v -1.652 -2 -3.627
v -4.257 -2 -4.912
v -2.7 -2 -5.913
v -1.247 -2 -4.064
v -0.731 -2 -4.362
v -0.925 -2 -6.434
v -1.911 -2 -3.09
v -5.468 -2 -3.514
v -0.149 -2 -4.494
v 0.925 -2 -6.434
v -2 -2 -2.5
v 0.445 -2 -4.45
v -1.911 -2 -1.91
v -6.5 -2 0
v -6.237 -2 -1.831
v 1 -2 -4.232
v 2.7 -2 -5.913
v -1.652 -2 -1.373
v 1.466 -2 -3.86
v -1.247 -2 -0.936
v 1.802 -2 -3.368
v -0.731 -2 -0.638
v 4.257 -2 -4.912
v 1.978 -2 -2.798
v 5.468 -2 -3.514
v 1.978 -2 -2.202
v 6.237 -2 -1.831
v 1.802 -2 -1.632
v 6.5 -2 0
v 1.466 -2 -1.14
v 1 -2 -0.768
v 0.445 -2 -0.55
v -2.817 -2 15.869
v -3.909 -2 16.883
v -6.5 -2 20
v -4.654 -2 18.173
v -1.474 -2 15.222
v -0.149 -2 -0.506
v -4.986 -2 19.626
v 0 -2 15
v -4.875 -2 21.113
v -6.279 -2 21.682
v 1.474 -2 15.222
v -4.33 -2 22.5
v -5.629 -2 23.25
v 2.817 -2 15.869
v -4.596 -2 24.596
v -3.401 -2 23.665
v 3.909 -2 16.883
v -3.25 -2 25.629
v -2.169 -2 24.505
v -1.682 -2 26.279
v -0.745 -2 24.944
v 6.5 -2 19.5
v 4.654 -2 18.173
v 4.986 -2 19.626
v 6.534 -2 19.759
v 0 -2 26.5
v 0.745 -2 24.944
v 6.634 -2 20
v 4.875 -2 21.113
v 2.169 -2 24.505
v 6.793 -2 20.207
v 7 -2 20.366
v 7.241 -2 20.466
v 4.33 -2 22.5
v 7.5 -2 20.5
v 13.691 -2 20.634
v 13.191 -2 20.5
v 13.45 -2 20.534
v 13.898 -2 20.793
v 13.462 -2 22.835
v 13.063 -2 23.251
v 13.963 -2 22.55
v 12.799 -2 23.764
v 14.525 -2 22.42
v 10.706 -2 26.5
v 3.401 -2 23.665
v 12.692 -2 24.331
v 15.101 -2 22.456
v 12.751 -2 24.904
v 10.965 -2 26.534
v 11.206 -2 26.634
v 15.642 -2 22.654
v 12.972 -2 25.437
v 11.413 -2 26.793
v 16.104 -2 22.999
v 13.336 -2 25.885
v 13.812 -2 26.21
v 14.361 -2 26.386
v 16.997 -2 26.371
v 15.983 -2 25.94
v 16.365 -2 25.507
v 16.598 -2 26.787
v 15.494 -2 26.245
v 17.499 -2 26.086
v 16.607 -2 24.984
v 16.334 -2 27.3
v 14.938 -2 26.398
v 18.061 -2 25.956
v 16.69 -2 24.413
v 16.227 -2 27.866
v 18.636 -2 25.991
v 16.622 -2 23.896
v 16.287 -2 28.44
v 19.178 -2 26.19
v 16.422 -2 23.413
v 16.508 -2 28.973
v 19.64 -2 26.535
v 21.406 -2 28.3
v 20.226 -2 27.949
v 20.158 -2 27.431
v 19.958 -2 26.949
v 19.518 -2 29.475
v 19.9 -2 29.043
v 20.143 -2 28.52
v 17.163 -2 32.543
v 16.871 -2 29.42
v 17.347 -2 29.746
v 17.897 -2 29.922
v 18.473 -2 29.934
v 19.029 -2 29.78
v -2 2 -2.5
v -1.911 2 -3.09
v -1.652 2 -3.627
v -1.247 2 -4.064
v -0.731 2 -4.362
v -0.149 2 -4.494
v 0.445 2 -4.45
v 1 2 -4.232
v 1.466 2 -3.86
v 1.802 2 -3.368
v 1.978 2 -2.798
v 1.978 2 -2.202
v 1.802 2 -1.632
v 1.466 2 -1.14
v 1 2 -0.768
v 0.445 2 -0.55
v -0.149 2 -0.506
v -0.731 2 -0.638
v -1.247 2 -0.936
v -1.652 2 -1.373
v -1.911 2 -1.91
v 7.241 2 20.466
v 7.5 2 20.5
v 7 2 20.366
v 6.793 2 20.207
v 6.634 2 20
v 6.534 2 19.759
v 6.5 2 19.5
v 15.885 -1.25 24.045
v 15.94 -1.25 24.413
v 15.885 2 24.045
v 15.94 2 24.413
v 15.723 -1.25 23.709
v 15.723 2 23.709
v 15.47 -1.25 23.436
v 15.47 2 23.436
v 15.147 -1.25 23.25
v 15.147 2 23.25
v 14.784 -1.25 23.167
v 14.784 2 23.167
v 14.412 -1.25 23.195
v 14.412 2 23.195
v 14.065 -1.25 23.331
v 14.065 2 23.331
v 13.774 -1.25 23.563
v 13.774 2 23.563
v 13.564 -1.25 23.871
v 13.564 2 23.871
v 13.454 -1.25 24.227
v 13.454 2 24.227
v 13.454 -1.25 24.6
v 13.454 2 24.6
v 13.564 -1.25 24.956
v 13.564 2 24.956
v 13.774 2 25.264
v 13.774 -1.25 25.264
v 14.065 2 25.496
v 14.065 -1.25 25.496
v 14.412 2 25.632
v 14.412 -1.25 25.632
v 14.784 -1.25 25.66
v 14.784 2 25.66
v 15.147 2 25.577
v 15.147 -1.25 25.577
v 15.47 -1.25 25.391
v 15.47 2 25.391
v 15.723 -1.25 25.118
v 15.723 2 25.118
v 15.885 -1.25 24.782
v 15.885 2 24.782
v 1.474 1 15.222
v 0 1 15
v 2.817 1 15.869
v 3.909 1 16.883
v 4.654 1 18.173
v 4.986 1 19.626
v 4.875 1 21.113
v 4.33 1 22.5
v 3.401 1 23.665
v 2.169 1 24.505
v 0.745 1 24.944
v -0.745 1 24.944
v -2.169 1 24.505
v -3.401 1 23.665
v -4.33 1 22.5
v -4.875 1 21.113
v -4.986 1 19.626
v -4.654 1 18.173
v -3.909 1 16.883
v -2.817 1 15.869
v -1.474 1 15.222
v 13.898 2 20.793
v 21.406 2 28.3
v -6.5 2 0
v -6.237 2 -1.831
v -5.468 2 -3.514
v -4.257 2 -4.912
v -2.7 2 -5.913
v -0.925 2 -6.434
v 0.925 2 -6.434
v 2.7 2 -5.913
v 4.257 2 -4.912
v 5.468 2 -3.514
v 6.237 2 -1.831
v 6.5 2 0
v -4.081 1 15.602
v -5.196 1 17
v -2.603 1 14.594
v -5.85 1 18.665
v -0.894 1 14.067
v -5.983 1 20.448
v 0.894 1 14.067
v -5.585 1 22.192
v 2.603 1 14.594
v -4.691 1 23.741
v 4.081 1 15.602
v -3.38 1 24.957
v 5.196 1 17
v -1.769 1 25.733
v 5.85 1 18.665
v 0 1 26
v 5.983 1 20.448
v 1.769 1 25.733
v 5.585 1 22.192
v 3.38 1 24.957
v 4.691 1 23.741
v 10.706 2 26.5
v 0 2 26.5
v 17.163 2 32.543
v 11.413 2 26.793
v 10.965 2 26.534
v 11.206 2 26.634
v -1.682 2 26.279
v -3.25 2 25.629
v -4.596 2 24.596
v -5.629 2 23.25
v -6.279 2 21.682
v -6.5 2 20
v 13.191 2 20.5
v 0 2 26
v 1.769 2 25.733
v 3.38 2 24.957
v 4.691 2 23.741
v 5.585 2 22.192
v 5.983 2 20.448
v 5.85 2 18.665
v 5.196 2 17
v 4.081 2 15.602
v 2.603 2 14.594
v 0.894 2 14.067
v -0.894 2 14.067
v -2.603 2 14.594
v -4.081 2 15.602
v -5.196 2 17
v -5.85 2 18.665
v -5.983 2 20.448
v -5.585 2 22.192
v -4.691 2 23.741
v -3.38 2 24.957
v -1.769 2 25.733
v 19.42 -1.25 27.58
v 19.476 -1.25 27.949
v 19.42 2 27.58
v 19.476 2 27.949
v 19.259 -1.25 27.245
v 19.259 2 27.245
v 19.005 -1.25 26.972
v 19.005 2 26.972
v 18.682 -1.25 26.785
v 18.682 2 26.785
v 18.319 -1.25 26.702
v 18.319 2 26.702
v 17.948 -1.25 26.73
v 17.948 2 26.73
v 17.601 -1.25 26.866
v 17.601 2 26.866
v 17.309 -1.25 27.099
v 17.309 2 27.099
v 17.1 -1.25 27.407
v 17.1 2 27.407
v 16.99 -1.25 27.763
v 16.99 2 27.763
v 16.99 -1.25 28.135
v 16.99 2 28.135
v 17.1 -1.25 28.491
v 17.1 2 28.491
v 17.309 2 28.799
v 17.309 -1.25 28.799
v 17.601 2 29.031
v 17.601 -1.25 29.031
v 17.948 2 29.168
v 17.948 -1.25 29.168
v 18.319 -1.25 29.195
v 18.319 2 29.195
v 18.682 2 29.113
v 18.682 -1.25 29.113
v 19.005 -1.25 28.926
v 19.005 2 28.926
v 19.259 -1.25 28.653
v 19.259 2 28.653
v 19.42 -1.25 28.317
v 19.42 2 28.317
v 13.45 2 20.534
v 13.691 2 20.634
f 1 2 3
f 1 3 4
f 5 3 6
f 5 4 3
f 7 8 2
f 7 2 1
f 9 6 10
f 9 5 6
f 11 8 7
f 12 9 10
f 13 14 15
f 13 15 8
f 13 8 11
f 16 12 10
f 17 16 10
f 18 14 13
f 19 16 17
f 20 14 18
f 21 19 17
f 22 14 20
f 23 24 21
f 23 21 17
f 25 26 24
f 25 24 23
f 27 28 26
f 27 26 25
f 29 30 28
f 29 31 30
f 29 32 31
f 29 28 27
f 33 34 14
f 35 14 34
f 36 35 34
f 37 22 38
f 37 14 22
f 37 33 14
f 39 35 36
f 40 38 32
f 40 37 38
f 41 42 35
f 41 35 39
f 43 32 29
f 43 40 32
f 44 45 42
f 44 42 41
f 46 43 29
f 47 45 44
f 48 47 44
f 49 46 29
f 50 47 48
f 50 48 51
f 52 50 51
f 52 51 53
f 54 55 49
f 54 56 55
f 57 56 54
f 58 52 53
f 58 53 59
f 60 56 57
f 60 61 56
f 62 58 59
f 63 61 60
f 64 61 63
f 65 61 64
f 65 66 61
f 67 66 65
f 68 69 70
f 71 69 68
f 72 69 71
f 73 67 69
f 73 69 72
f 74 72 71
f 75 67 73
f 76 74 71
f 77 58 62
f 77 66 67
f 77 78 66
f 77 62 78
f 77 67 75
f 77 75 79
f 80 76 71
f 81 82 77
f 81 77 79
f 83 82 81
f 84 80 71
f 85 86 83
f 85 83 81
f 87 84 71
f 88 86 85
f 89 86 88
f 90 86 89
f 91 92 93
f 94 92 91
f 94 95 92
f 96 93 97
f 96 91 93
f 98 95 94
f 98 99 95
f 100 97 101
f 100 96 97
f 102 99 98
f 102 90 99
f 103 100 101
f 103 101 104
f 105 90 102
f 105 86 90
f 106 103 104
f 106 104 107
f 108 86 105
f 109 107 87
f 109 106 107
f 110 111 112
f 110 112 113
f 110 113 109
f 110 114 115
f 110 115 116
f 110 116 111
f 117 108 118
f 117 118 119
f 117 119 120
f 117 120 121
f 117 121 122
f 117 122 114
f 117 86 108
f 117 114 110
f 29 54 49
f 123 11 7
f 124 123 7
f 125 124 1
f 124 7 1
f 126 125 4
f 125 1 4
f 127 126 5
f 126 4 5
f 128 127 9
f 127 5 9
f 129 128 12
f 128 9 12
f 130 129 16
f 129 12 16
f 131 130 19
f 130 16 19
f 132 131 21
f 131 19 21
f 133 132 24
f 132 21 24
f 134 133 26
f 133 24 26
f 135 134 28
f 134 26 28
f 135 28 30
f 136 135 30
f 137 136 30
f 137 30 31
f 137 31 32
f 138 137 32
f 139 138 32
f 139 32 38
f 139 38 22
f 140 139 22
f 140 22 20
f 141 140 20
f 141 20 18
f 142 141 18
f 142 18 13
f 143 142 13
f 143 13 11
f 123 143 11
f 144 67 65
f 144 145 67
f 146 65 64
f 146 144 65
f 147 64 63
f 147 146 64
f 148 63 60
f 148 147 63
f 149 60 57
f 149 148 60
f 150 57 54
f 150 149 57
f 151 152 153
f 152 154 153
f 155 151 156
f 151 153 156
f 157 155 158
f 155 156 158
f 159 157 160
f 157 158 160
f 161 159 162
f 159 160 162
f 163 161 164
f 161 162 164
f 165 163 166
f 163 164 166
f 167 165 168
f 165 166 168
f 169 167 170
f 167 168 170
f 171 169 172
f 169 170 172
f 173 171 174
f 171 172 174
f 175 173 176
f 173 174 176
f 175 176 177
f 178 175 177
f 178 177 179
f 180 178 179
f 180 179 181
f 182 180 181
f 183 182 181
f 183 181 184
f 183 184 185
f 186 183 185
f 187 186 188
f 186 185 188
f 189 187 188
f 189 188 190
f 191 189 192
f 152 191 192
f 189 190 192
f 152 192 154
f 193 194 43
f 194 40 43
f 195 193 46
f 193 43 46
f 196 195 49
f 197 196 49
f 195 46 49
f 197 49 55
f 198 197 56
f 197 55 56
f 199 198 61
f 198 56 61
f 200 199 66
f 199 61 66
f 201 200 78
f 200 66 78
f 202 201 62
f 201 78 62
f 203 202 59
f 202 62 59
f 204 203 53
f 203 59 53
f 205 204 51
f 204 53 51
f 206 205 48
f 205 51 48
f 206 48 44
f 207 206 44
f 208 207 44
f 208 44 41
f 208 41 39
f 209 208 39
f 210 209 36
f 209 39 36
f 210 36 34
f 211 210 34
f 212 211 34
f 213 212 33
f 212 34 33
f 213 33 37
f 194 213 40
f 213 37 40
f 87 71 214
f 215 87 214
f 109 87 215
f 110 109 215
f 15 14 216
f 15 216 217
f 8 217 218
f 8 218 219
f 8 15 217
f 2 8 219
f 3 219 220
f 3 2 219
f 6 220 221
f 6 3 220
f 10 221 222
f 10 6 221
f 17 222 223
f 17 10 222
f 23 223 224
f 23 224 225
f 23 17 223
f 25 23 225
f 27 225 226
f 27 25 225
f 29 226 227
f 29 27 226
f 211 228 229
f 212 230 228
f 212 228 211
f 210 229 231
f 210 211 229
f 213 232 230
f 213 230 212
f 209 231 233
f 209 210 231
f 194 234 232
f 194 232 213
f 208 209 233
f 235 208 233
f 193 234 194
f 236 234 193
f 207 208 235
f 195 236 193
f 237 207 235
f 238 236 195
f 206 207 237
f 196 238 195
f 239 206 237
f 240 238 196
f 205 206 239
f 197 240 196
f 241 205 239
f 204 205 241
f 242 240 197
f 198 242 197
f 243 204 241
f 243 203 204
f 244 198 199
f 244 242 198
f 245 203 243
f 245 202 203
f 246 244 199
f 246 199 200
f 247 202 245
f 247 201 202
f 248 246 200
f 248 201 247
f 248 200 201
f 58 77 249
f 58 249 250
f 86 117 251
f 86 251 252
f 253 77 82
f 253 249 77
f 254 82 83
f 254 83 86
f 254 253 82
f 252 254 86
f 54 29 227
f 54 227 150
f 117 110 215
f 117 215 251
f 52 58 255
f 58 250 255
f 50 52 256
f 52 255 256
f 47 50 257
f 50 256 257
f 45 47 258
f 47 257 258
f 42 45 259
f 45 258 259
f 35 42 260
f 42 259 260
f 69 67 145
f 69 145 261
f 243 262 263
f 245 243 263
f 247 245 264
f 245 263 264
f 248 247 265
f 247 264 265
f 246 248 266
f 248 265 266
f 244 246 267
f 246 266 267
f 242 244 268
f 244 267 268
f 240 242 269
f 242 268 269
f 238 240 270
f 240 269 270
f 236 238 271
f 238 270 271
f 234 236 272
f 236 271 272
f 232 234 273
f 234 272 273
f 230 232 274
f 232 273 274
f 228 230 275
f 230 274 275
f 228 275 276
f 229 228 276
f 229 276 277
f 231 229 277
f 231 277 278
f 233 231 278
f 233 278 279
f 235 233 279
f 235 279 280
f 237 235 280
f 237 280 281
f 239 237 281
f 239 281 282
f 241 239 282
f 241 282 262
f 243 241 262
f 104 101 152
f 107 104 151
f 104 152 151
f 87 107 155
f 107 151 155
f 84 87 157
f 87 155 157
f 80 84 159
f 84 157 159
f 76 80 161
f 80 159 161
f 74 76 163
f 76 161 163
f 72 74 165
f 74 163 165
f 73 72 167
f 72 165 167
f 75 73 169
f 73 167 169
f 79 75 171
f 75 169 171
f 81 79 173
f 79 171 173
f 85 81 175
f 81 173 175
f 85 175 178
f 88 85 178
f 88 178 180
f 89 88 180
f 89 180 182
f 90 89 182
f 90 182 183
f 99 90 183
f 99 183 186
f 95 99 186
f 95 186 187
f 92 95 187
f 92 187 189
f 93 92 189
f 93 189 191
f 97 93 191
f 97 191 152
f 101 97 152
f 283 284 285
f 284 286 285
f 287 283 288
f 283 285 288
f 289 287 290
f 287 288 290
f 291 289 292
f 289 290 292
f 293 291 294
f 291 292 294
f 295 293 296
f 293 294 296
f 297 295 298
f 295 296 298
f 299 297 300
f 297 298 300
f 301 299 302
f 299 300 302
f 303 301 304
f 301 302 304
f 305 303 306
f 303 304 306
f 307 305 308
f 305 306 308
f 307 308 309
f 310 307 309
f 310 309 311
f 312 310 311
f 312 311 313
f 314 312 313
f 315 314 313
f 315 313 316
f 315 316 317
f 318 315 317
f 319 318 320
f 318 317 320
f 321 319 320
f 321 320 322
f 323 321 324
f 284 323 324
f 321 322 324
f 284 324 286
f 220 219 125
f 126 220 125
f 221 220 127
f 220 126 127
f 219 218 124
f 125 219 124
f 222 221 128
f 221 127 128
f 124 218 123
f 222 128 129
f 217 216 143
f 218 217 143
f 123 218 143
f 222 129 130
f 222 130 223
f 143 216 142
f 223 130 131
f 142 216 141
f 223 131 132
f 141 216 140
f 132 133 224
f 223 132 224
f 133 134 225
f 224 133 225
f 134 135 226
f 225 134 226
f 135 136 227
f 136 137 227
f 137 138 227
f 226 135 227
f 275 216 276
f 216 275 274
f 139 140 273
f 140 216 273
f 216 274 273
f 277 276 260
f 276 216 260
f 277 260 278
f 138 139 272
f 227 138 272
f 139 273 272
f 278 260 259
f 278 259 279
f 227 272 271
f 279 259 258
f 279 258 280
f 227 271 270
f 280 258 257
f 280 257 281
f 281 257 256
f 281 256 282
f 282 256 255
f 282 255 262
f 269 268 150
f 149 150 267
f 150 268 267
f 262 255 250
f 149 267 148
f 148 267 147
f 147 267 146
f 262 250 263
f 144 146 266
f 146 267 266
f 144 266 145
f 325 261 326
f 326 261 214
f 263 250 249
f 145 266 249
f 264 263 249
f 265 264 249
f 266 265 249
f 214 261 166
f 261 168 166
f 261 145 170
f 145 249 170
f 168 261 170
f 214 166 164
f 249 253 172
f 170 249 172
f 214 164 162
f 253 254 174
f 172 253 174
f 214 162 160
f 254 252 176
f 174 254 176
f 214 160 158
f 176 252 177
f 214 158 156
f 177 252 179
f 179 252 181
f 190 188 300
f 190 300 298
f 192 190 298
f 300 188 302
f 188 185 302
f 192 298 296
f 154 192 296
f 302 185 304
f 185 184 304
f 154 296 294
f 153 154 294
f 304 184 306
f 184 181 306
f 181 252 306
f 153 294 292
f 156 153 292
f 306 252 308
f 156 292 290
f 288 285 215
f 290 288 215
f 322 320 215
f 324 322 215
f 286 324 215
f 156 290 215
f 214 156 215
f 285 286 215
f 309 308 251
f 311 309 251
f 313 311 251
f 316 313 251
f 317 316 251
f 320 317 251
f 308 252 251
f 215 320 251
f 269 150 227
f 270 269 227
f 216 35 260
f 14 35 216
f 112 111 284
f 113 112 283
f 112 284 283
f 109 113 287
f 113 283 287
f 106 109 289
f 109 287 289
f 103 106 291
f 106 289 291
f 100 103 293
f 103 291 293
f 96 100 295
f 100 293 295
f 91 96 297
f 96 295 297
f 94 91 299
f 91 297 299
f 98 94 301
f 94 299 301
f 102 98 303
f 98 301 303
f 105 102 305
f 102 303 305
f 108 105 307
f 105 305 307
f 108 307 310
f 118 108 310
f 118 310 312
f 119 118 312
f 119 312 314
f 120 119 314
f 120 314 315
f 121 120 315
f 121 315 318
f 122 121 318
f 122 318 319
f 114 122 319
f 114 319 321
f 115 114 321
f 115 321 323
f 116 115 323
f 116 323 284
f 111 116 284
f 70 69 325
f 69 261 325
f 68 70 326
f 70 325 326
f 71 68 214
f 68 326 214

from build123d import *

# Parameters (mm, degrees)
BOSS_EXTRUDE1_DEPTH           = 4
DRAFT1_ANGLE                  = 45.000000004
DRAFT2_ANGLE                  = 45.000000005
F_4_0_4_DIAMETER_HOLE1_D      = 4
CSK_FOR_M3_SFHCS1_D           = 2.5
CSK_FOR_M3_SFHCS1_CSINK_D     = 4
CSK_FOR_M3_SFHCS1_CSINK_ANGLE = 90
FILLET1_R                     = 1
FILLET2_R                     = 6.5
HOLE2_D                       = 10
HOLE2_CBORE_D                 = 12
HOLE2_CBORE_DEPTH             = 1


with BuildPart() as part:
    # Sketch1 → Boss-Extrude1 (new body)
    with BuildSketch(Plane.XZ.offset(2)):
        with BuildLine():
            Line((11.12, 26.5), (-6.5, 26.5))
            Line((-6.5, 26.5), (-6.5, 0))
            ThreePointArc((-6.5, 0), (3e-09, -6.500000003), (6.500000005, 0))
            Line((6.500000005, 0), (6.500000005, 20.5))
            Line((6.500000005, 20.5), (13.605281374, 20.5))
            Line((13.605281374, 20.5), (13.605281374, 36.100603473))
            Line((13.605281374, 36.100603473), (11.12, 38.585884847))
            Line((11.12, 38.585884847), (11.12, 26.5))
        make_face()
    extrude(amount=-BOSS_EXTRUDE1_DEPTH)

    # Draft1
    draft1_faces = [part.faces().sort_by_distance(p)[0] for p in [
        (13.605281374, 0, 28.300301737),
    ]]
    draft(draft1_faces, Plane(origin=(6.500000005, 2, 20.5), x_dir=(-1, 0, 0), z_dir=(0, 0, -1)), DRAFT1_ANGLE)

    # Draft2
    draft2_faces = [part.faces().sort_by_distance(p)[0] for p in [
        (11.12, 0, 32.542942424),
    ]]
    draft(draft2_faces, Plane(origin=(11.12, 2, 26.5), x_dir=(1, 0, 0), z_dir=(0, 0, 1)), DRAFT2_ANGLE)

    # Ø4.0 (4) Diameter Hole1 (through all)
    with Locations(Plane(origin=(0, 2, 0), x_dir=(1, 0, 0), z_dir=(0, 1, 0))):
        with Locations((0, 2.5)):
            Hole(F_4_0_4_DIAMETER_HOLE1_D / 2)

    # CSK for M3 SFHCS1 (through all)
    with Locations(Plane(origin=(0, -2, 0), x_dir=(-1, 0, 0), z_dir=(0, -1, 0))):
        with Locations((-14.690228422, -24.413374173), (-18.225762328, -27.948908079)):
            CounterSinkHole(CSK_FOR_M3_SFHCS1_D / 2, CSK_FOR_M3_SFHCS1_CSINK_D / 2, counter_sink_angle=CSK_FOR_M3_SFHCS1_CSINK_ANGLE)

    # Fillet1
    fillet1_edges = [part.edges().sort_by_distance(p)[0] for p in [
        (13.605281374, 0, 20.5),
        (6.500000005, 0, 20.5),
        (11.12, 0, 26.5),
    ]]
    fillet(fillet1_edges, radius=FILLET1_R)

    # Fillet2
    fillet2_edges = [part.edges().sort_by_distance(p)[0] for p in [
        (-6.5, 0, 26.5),
    ]]
    fillet(fillet2_edges, radius=FILLET2_R)

    # Hole2 (through all)
    with Locations(Plane(origin=(0, 2, 20), x_dir=(0, 0, 1), z_dir=(0, 1, 0))):
        with Locations((0, 0)):
            CounterBoreHole(HOLE2_D / 2, HOLE2_CBORE_D / 2, HOLE2_CBORE_DEPTH)


solid = part.part
